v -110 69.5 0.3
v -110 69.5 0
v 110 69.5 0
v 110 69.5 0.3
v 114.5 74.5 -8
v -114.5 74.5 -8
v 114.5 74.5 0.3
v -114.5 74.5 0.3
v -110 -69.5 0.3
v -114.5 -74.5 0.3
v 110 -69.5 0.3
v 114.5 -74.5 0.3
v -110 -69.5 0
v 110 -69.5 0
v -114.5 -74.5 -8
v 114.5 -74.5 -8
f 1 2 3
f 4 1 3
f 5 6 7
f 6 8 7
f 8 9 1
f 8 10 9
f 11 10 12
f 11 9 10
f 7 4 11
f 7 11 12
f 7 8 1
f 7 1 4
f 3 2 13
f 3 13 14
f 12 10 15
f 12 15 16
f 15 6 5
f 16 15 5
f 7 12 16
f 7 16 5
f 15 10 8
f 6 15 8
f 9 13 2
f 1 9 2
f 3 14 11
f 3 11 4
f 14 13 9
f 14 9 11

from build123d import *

# Parameters (mm, degrees)
F0_W          = 220
F0_H          = 139
F1_DEPTH      = 8
F0_W_2        = 229
F0_H_2        = 149
F2_DEPTH      = 0.3
F2_DEPTH_BACK = 8


with BuildPart() as f1:
    # F0 (on Top) → F1 (new body)
    with BuildSketch(Plane.XY):
        Rectangle(F0_W, F0_H)
    extrude(amount=-F1_DEPTH)

    # F0 (on Top) → F2 (join, two sides)
    with BuildSketch(Plane.XY) as f2_sk:
        Rectangle(F0_W_2, F0_H_2)
        Rectangle(F0_W, F0_H, mode=Mode.SUBTRACT)
    extrude(amount=F2_DEPTH)
    extrude(f2_sk.sketch, amount=-F2_DEPTH_BACK)


solid = f1.part
